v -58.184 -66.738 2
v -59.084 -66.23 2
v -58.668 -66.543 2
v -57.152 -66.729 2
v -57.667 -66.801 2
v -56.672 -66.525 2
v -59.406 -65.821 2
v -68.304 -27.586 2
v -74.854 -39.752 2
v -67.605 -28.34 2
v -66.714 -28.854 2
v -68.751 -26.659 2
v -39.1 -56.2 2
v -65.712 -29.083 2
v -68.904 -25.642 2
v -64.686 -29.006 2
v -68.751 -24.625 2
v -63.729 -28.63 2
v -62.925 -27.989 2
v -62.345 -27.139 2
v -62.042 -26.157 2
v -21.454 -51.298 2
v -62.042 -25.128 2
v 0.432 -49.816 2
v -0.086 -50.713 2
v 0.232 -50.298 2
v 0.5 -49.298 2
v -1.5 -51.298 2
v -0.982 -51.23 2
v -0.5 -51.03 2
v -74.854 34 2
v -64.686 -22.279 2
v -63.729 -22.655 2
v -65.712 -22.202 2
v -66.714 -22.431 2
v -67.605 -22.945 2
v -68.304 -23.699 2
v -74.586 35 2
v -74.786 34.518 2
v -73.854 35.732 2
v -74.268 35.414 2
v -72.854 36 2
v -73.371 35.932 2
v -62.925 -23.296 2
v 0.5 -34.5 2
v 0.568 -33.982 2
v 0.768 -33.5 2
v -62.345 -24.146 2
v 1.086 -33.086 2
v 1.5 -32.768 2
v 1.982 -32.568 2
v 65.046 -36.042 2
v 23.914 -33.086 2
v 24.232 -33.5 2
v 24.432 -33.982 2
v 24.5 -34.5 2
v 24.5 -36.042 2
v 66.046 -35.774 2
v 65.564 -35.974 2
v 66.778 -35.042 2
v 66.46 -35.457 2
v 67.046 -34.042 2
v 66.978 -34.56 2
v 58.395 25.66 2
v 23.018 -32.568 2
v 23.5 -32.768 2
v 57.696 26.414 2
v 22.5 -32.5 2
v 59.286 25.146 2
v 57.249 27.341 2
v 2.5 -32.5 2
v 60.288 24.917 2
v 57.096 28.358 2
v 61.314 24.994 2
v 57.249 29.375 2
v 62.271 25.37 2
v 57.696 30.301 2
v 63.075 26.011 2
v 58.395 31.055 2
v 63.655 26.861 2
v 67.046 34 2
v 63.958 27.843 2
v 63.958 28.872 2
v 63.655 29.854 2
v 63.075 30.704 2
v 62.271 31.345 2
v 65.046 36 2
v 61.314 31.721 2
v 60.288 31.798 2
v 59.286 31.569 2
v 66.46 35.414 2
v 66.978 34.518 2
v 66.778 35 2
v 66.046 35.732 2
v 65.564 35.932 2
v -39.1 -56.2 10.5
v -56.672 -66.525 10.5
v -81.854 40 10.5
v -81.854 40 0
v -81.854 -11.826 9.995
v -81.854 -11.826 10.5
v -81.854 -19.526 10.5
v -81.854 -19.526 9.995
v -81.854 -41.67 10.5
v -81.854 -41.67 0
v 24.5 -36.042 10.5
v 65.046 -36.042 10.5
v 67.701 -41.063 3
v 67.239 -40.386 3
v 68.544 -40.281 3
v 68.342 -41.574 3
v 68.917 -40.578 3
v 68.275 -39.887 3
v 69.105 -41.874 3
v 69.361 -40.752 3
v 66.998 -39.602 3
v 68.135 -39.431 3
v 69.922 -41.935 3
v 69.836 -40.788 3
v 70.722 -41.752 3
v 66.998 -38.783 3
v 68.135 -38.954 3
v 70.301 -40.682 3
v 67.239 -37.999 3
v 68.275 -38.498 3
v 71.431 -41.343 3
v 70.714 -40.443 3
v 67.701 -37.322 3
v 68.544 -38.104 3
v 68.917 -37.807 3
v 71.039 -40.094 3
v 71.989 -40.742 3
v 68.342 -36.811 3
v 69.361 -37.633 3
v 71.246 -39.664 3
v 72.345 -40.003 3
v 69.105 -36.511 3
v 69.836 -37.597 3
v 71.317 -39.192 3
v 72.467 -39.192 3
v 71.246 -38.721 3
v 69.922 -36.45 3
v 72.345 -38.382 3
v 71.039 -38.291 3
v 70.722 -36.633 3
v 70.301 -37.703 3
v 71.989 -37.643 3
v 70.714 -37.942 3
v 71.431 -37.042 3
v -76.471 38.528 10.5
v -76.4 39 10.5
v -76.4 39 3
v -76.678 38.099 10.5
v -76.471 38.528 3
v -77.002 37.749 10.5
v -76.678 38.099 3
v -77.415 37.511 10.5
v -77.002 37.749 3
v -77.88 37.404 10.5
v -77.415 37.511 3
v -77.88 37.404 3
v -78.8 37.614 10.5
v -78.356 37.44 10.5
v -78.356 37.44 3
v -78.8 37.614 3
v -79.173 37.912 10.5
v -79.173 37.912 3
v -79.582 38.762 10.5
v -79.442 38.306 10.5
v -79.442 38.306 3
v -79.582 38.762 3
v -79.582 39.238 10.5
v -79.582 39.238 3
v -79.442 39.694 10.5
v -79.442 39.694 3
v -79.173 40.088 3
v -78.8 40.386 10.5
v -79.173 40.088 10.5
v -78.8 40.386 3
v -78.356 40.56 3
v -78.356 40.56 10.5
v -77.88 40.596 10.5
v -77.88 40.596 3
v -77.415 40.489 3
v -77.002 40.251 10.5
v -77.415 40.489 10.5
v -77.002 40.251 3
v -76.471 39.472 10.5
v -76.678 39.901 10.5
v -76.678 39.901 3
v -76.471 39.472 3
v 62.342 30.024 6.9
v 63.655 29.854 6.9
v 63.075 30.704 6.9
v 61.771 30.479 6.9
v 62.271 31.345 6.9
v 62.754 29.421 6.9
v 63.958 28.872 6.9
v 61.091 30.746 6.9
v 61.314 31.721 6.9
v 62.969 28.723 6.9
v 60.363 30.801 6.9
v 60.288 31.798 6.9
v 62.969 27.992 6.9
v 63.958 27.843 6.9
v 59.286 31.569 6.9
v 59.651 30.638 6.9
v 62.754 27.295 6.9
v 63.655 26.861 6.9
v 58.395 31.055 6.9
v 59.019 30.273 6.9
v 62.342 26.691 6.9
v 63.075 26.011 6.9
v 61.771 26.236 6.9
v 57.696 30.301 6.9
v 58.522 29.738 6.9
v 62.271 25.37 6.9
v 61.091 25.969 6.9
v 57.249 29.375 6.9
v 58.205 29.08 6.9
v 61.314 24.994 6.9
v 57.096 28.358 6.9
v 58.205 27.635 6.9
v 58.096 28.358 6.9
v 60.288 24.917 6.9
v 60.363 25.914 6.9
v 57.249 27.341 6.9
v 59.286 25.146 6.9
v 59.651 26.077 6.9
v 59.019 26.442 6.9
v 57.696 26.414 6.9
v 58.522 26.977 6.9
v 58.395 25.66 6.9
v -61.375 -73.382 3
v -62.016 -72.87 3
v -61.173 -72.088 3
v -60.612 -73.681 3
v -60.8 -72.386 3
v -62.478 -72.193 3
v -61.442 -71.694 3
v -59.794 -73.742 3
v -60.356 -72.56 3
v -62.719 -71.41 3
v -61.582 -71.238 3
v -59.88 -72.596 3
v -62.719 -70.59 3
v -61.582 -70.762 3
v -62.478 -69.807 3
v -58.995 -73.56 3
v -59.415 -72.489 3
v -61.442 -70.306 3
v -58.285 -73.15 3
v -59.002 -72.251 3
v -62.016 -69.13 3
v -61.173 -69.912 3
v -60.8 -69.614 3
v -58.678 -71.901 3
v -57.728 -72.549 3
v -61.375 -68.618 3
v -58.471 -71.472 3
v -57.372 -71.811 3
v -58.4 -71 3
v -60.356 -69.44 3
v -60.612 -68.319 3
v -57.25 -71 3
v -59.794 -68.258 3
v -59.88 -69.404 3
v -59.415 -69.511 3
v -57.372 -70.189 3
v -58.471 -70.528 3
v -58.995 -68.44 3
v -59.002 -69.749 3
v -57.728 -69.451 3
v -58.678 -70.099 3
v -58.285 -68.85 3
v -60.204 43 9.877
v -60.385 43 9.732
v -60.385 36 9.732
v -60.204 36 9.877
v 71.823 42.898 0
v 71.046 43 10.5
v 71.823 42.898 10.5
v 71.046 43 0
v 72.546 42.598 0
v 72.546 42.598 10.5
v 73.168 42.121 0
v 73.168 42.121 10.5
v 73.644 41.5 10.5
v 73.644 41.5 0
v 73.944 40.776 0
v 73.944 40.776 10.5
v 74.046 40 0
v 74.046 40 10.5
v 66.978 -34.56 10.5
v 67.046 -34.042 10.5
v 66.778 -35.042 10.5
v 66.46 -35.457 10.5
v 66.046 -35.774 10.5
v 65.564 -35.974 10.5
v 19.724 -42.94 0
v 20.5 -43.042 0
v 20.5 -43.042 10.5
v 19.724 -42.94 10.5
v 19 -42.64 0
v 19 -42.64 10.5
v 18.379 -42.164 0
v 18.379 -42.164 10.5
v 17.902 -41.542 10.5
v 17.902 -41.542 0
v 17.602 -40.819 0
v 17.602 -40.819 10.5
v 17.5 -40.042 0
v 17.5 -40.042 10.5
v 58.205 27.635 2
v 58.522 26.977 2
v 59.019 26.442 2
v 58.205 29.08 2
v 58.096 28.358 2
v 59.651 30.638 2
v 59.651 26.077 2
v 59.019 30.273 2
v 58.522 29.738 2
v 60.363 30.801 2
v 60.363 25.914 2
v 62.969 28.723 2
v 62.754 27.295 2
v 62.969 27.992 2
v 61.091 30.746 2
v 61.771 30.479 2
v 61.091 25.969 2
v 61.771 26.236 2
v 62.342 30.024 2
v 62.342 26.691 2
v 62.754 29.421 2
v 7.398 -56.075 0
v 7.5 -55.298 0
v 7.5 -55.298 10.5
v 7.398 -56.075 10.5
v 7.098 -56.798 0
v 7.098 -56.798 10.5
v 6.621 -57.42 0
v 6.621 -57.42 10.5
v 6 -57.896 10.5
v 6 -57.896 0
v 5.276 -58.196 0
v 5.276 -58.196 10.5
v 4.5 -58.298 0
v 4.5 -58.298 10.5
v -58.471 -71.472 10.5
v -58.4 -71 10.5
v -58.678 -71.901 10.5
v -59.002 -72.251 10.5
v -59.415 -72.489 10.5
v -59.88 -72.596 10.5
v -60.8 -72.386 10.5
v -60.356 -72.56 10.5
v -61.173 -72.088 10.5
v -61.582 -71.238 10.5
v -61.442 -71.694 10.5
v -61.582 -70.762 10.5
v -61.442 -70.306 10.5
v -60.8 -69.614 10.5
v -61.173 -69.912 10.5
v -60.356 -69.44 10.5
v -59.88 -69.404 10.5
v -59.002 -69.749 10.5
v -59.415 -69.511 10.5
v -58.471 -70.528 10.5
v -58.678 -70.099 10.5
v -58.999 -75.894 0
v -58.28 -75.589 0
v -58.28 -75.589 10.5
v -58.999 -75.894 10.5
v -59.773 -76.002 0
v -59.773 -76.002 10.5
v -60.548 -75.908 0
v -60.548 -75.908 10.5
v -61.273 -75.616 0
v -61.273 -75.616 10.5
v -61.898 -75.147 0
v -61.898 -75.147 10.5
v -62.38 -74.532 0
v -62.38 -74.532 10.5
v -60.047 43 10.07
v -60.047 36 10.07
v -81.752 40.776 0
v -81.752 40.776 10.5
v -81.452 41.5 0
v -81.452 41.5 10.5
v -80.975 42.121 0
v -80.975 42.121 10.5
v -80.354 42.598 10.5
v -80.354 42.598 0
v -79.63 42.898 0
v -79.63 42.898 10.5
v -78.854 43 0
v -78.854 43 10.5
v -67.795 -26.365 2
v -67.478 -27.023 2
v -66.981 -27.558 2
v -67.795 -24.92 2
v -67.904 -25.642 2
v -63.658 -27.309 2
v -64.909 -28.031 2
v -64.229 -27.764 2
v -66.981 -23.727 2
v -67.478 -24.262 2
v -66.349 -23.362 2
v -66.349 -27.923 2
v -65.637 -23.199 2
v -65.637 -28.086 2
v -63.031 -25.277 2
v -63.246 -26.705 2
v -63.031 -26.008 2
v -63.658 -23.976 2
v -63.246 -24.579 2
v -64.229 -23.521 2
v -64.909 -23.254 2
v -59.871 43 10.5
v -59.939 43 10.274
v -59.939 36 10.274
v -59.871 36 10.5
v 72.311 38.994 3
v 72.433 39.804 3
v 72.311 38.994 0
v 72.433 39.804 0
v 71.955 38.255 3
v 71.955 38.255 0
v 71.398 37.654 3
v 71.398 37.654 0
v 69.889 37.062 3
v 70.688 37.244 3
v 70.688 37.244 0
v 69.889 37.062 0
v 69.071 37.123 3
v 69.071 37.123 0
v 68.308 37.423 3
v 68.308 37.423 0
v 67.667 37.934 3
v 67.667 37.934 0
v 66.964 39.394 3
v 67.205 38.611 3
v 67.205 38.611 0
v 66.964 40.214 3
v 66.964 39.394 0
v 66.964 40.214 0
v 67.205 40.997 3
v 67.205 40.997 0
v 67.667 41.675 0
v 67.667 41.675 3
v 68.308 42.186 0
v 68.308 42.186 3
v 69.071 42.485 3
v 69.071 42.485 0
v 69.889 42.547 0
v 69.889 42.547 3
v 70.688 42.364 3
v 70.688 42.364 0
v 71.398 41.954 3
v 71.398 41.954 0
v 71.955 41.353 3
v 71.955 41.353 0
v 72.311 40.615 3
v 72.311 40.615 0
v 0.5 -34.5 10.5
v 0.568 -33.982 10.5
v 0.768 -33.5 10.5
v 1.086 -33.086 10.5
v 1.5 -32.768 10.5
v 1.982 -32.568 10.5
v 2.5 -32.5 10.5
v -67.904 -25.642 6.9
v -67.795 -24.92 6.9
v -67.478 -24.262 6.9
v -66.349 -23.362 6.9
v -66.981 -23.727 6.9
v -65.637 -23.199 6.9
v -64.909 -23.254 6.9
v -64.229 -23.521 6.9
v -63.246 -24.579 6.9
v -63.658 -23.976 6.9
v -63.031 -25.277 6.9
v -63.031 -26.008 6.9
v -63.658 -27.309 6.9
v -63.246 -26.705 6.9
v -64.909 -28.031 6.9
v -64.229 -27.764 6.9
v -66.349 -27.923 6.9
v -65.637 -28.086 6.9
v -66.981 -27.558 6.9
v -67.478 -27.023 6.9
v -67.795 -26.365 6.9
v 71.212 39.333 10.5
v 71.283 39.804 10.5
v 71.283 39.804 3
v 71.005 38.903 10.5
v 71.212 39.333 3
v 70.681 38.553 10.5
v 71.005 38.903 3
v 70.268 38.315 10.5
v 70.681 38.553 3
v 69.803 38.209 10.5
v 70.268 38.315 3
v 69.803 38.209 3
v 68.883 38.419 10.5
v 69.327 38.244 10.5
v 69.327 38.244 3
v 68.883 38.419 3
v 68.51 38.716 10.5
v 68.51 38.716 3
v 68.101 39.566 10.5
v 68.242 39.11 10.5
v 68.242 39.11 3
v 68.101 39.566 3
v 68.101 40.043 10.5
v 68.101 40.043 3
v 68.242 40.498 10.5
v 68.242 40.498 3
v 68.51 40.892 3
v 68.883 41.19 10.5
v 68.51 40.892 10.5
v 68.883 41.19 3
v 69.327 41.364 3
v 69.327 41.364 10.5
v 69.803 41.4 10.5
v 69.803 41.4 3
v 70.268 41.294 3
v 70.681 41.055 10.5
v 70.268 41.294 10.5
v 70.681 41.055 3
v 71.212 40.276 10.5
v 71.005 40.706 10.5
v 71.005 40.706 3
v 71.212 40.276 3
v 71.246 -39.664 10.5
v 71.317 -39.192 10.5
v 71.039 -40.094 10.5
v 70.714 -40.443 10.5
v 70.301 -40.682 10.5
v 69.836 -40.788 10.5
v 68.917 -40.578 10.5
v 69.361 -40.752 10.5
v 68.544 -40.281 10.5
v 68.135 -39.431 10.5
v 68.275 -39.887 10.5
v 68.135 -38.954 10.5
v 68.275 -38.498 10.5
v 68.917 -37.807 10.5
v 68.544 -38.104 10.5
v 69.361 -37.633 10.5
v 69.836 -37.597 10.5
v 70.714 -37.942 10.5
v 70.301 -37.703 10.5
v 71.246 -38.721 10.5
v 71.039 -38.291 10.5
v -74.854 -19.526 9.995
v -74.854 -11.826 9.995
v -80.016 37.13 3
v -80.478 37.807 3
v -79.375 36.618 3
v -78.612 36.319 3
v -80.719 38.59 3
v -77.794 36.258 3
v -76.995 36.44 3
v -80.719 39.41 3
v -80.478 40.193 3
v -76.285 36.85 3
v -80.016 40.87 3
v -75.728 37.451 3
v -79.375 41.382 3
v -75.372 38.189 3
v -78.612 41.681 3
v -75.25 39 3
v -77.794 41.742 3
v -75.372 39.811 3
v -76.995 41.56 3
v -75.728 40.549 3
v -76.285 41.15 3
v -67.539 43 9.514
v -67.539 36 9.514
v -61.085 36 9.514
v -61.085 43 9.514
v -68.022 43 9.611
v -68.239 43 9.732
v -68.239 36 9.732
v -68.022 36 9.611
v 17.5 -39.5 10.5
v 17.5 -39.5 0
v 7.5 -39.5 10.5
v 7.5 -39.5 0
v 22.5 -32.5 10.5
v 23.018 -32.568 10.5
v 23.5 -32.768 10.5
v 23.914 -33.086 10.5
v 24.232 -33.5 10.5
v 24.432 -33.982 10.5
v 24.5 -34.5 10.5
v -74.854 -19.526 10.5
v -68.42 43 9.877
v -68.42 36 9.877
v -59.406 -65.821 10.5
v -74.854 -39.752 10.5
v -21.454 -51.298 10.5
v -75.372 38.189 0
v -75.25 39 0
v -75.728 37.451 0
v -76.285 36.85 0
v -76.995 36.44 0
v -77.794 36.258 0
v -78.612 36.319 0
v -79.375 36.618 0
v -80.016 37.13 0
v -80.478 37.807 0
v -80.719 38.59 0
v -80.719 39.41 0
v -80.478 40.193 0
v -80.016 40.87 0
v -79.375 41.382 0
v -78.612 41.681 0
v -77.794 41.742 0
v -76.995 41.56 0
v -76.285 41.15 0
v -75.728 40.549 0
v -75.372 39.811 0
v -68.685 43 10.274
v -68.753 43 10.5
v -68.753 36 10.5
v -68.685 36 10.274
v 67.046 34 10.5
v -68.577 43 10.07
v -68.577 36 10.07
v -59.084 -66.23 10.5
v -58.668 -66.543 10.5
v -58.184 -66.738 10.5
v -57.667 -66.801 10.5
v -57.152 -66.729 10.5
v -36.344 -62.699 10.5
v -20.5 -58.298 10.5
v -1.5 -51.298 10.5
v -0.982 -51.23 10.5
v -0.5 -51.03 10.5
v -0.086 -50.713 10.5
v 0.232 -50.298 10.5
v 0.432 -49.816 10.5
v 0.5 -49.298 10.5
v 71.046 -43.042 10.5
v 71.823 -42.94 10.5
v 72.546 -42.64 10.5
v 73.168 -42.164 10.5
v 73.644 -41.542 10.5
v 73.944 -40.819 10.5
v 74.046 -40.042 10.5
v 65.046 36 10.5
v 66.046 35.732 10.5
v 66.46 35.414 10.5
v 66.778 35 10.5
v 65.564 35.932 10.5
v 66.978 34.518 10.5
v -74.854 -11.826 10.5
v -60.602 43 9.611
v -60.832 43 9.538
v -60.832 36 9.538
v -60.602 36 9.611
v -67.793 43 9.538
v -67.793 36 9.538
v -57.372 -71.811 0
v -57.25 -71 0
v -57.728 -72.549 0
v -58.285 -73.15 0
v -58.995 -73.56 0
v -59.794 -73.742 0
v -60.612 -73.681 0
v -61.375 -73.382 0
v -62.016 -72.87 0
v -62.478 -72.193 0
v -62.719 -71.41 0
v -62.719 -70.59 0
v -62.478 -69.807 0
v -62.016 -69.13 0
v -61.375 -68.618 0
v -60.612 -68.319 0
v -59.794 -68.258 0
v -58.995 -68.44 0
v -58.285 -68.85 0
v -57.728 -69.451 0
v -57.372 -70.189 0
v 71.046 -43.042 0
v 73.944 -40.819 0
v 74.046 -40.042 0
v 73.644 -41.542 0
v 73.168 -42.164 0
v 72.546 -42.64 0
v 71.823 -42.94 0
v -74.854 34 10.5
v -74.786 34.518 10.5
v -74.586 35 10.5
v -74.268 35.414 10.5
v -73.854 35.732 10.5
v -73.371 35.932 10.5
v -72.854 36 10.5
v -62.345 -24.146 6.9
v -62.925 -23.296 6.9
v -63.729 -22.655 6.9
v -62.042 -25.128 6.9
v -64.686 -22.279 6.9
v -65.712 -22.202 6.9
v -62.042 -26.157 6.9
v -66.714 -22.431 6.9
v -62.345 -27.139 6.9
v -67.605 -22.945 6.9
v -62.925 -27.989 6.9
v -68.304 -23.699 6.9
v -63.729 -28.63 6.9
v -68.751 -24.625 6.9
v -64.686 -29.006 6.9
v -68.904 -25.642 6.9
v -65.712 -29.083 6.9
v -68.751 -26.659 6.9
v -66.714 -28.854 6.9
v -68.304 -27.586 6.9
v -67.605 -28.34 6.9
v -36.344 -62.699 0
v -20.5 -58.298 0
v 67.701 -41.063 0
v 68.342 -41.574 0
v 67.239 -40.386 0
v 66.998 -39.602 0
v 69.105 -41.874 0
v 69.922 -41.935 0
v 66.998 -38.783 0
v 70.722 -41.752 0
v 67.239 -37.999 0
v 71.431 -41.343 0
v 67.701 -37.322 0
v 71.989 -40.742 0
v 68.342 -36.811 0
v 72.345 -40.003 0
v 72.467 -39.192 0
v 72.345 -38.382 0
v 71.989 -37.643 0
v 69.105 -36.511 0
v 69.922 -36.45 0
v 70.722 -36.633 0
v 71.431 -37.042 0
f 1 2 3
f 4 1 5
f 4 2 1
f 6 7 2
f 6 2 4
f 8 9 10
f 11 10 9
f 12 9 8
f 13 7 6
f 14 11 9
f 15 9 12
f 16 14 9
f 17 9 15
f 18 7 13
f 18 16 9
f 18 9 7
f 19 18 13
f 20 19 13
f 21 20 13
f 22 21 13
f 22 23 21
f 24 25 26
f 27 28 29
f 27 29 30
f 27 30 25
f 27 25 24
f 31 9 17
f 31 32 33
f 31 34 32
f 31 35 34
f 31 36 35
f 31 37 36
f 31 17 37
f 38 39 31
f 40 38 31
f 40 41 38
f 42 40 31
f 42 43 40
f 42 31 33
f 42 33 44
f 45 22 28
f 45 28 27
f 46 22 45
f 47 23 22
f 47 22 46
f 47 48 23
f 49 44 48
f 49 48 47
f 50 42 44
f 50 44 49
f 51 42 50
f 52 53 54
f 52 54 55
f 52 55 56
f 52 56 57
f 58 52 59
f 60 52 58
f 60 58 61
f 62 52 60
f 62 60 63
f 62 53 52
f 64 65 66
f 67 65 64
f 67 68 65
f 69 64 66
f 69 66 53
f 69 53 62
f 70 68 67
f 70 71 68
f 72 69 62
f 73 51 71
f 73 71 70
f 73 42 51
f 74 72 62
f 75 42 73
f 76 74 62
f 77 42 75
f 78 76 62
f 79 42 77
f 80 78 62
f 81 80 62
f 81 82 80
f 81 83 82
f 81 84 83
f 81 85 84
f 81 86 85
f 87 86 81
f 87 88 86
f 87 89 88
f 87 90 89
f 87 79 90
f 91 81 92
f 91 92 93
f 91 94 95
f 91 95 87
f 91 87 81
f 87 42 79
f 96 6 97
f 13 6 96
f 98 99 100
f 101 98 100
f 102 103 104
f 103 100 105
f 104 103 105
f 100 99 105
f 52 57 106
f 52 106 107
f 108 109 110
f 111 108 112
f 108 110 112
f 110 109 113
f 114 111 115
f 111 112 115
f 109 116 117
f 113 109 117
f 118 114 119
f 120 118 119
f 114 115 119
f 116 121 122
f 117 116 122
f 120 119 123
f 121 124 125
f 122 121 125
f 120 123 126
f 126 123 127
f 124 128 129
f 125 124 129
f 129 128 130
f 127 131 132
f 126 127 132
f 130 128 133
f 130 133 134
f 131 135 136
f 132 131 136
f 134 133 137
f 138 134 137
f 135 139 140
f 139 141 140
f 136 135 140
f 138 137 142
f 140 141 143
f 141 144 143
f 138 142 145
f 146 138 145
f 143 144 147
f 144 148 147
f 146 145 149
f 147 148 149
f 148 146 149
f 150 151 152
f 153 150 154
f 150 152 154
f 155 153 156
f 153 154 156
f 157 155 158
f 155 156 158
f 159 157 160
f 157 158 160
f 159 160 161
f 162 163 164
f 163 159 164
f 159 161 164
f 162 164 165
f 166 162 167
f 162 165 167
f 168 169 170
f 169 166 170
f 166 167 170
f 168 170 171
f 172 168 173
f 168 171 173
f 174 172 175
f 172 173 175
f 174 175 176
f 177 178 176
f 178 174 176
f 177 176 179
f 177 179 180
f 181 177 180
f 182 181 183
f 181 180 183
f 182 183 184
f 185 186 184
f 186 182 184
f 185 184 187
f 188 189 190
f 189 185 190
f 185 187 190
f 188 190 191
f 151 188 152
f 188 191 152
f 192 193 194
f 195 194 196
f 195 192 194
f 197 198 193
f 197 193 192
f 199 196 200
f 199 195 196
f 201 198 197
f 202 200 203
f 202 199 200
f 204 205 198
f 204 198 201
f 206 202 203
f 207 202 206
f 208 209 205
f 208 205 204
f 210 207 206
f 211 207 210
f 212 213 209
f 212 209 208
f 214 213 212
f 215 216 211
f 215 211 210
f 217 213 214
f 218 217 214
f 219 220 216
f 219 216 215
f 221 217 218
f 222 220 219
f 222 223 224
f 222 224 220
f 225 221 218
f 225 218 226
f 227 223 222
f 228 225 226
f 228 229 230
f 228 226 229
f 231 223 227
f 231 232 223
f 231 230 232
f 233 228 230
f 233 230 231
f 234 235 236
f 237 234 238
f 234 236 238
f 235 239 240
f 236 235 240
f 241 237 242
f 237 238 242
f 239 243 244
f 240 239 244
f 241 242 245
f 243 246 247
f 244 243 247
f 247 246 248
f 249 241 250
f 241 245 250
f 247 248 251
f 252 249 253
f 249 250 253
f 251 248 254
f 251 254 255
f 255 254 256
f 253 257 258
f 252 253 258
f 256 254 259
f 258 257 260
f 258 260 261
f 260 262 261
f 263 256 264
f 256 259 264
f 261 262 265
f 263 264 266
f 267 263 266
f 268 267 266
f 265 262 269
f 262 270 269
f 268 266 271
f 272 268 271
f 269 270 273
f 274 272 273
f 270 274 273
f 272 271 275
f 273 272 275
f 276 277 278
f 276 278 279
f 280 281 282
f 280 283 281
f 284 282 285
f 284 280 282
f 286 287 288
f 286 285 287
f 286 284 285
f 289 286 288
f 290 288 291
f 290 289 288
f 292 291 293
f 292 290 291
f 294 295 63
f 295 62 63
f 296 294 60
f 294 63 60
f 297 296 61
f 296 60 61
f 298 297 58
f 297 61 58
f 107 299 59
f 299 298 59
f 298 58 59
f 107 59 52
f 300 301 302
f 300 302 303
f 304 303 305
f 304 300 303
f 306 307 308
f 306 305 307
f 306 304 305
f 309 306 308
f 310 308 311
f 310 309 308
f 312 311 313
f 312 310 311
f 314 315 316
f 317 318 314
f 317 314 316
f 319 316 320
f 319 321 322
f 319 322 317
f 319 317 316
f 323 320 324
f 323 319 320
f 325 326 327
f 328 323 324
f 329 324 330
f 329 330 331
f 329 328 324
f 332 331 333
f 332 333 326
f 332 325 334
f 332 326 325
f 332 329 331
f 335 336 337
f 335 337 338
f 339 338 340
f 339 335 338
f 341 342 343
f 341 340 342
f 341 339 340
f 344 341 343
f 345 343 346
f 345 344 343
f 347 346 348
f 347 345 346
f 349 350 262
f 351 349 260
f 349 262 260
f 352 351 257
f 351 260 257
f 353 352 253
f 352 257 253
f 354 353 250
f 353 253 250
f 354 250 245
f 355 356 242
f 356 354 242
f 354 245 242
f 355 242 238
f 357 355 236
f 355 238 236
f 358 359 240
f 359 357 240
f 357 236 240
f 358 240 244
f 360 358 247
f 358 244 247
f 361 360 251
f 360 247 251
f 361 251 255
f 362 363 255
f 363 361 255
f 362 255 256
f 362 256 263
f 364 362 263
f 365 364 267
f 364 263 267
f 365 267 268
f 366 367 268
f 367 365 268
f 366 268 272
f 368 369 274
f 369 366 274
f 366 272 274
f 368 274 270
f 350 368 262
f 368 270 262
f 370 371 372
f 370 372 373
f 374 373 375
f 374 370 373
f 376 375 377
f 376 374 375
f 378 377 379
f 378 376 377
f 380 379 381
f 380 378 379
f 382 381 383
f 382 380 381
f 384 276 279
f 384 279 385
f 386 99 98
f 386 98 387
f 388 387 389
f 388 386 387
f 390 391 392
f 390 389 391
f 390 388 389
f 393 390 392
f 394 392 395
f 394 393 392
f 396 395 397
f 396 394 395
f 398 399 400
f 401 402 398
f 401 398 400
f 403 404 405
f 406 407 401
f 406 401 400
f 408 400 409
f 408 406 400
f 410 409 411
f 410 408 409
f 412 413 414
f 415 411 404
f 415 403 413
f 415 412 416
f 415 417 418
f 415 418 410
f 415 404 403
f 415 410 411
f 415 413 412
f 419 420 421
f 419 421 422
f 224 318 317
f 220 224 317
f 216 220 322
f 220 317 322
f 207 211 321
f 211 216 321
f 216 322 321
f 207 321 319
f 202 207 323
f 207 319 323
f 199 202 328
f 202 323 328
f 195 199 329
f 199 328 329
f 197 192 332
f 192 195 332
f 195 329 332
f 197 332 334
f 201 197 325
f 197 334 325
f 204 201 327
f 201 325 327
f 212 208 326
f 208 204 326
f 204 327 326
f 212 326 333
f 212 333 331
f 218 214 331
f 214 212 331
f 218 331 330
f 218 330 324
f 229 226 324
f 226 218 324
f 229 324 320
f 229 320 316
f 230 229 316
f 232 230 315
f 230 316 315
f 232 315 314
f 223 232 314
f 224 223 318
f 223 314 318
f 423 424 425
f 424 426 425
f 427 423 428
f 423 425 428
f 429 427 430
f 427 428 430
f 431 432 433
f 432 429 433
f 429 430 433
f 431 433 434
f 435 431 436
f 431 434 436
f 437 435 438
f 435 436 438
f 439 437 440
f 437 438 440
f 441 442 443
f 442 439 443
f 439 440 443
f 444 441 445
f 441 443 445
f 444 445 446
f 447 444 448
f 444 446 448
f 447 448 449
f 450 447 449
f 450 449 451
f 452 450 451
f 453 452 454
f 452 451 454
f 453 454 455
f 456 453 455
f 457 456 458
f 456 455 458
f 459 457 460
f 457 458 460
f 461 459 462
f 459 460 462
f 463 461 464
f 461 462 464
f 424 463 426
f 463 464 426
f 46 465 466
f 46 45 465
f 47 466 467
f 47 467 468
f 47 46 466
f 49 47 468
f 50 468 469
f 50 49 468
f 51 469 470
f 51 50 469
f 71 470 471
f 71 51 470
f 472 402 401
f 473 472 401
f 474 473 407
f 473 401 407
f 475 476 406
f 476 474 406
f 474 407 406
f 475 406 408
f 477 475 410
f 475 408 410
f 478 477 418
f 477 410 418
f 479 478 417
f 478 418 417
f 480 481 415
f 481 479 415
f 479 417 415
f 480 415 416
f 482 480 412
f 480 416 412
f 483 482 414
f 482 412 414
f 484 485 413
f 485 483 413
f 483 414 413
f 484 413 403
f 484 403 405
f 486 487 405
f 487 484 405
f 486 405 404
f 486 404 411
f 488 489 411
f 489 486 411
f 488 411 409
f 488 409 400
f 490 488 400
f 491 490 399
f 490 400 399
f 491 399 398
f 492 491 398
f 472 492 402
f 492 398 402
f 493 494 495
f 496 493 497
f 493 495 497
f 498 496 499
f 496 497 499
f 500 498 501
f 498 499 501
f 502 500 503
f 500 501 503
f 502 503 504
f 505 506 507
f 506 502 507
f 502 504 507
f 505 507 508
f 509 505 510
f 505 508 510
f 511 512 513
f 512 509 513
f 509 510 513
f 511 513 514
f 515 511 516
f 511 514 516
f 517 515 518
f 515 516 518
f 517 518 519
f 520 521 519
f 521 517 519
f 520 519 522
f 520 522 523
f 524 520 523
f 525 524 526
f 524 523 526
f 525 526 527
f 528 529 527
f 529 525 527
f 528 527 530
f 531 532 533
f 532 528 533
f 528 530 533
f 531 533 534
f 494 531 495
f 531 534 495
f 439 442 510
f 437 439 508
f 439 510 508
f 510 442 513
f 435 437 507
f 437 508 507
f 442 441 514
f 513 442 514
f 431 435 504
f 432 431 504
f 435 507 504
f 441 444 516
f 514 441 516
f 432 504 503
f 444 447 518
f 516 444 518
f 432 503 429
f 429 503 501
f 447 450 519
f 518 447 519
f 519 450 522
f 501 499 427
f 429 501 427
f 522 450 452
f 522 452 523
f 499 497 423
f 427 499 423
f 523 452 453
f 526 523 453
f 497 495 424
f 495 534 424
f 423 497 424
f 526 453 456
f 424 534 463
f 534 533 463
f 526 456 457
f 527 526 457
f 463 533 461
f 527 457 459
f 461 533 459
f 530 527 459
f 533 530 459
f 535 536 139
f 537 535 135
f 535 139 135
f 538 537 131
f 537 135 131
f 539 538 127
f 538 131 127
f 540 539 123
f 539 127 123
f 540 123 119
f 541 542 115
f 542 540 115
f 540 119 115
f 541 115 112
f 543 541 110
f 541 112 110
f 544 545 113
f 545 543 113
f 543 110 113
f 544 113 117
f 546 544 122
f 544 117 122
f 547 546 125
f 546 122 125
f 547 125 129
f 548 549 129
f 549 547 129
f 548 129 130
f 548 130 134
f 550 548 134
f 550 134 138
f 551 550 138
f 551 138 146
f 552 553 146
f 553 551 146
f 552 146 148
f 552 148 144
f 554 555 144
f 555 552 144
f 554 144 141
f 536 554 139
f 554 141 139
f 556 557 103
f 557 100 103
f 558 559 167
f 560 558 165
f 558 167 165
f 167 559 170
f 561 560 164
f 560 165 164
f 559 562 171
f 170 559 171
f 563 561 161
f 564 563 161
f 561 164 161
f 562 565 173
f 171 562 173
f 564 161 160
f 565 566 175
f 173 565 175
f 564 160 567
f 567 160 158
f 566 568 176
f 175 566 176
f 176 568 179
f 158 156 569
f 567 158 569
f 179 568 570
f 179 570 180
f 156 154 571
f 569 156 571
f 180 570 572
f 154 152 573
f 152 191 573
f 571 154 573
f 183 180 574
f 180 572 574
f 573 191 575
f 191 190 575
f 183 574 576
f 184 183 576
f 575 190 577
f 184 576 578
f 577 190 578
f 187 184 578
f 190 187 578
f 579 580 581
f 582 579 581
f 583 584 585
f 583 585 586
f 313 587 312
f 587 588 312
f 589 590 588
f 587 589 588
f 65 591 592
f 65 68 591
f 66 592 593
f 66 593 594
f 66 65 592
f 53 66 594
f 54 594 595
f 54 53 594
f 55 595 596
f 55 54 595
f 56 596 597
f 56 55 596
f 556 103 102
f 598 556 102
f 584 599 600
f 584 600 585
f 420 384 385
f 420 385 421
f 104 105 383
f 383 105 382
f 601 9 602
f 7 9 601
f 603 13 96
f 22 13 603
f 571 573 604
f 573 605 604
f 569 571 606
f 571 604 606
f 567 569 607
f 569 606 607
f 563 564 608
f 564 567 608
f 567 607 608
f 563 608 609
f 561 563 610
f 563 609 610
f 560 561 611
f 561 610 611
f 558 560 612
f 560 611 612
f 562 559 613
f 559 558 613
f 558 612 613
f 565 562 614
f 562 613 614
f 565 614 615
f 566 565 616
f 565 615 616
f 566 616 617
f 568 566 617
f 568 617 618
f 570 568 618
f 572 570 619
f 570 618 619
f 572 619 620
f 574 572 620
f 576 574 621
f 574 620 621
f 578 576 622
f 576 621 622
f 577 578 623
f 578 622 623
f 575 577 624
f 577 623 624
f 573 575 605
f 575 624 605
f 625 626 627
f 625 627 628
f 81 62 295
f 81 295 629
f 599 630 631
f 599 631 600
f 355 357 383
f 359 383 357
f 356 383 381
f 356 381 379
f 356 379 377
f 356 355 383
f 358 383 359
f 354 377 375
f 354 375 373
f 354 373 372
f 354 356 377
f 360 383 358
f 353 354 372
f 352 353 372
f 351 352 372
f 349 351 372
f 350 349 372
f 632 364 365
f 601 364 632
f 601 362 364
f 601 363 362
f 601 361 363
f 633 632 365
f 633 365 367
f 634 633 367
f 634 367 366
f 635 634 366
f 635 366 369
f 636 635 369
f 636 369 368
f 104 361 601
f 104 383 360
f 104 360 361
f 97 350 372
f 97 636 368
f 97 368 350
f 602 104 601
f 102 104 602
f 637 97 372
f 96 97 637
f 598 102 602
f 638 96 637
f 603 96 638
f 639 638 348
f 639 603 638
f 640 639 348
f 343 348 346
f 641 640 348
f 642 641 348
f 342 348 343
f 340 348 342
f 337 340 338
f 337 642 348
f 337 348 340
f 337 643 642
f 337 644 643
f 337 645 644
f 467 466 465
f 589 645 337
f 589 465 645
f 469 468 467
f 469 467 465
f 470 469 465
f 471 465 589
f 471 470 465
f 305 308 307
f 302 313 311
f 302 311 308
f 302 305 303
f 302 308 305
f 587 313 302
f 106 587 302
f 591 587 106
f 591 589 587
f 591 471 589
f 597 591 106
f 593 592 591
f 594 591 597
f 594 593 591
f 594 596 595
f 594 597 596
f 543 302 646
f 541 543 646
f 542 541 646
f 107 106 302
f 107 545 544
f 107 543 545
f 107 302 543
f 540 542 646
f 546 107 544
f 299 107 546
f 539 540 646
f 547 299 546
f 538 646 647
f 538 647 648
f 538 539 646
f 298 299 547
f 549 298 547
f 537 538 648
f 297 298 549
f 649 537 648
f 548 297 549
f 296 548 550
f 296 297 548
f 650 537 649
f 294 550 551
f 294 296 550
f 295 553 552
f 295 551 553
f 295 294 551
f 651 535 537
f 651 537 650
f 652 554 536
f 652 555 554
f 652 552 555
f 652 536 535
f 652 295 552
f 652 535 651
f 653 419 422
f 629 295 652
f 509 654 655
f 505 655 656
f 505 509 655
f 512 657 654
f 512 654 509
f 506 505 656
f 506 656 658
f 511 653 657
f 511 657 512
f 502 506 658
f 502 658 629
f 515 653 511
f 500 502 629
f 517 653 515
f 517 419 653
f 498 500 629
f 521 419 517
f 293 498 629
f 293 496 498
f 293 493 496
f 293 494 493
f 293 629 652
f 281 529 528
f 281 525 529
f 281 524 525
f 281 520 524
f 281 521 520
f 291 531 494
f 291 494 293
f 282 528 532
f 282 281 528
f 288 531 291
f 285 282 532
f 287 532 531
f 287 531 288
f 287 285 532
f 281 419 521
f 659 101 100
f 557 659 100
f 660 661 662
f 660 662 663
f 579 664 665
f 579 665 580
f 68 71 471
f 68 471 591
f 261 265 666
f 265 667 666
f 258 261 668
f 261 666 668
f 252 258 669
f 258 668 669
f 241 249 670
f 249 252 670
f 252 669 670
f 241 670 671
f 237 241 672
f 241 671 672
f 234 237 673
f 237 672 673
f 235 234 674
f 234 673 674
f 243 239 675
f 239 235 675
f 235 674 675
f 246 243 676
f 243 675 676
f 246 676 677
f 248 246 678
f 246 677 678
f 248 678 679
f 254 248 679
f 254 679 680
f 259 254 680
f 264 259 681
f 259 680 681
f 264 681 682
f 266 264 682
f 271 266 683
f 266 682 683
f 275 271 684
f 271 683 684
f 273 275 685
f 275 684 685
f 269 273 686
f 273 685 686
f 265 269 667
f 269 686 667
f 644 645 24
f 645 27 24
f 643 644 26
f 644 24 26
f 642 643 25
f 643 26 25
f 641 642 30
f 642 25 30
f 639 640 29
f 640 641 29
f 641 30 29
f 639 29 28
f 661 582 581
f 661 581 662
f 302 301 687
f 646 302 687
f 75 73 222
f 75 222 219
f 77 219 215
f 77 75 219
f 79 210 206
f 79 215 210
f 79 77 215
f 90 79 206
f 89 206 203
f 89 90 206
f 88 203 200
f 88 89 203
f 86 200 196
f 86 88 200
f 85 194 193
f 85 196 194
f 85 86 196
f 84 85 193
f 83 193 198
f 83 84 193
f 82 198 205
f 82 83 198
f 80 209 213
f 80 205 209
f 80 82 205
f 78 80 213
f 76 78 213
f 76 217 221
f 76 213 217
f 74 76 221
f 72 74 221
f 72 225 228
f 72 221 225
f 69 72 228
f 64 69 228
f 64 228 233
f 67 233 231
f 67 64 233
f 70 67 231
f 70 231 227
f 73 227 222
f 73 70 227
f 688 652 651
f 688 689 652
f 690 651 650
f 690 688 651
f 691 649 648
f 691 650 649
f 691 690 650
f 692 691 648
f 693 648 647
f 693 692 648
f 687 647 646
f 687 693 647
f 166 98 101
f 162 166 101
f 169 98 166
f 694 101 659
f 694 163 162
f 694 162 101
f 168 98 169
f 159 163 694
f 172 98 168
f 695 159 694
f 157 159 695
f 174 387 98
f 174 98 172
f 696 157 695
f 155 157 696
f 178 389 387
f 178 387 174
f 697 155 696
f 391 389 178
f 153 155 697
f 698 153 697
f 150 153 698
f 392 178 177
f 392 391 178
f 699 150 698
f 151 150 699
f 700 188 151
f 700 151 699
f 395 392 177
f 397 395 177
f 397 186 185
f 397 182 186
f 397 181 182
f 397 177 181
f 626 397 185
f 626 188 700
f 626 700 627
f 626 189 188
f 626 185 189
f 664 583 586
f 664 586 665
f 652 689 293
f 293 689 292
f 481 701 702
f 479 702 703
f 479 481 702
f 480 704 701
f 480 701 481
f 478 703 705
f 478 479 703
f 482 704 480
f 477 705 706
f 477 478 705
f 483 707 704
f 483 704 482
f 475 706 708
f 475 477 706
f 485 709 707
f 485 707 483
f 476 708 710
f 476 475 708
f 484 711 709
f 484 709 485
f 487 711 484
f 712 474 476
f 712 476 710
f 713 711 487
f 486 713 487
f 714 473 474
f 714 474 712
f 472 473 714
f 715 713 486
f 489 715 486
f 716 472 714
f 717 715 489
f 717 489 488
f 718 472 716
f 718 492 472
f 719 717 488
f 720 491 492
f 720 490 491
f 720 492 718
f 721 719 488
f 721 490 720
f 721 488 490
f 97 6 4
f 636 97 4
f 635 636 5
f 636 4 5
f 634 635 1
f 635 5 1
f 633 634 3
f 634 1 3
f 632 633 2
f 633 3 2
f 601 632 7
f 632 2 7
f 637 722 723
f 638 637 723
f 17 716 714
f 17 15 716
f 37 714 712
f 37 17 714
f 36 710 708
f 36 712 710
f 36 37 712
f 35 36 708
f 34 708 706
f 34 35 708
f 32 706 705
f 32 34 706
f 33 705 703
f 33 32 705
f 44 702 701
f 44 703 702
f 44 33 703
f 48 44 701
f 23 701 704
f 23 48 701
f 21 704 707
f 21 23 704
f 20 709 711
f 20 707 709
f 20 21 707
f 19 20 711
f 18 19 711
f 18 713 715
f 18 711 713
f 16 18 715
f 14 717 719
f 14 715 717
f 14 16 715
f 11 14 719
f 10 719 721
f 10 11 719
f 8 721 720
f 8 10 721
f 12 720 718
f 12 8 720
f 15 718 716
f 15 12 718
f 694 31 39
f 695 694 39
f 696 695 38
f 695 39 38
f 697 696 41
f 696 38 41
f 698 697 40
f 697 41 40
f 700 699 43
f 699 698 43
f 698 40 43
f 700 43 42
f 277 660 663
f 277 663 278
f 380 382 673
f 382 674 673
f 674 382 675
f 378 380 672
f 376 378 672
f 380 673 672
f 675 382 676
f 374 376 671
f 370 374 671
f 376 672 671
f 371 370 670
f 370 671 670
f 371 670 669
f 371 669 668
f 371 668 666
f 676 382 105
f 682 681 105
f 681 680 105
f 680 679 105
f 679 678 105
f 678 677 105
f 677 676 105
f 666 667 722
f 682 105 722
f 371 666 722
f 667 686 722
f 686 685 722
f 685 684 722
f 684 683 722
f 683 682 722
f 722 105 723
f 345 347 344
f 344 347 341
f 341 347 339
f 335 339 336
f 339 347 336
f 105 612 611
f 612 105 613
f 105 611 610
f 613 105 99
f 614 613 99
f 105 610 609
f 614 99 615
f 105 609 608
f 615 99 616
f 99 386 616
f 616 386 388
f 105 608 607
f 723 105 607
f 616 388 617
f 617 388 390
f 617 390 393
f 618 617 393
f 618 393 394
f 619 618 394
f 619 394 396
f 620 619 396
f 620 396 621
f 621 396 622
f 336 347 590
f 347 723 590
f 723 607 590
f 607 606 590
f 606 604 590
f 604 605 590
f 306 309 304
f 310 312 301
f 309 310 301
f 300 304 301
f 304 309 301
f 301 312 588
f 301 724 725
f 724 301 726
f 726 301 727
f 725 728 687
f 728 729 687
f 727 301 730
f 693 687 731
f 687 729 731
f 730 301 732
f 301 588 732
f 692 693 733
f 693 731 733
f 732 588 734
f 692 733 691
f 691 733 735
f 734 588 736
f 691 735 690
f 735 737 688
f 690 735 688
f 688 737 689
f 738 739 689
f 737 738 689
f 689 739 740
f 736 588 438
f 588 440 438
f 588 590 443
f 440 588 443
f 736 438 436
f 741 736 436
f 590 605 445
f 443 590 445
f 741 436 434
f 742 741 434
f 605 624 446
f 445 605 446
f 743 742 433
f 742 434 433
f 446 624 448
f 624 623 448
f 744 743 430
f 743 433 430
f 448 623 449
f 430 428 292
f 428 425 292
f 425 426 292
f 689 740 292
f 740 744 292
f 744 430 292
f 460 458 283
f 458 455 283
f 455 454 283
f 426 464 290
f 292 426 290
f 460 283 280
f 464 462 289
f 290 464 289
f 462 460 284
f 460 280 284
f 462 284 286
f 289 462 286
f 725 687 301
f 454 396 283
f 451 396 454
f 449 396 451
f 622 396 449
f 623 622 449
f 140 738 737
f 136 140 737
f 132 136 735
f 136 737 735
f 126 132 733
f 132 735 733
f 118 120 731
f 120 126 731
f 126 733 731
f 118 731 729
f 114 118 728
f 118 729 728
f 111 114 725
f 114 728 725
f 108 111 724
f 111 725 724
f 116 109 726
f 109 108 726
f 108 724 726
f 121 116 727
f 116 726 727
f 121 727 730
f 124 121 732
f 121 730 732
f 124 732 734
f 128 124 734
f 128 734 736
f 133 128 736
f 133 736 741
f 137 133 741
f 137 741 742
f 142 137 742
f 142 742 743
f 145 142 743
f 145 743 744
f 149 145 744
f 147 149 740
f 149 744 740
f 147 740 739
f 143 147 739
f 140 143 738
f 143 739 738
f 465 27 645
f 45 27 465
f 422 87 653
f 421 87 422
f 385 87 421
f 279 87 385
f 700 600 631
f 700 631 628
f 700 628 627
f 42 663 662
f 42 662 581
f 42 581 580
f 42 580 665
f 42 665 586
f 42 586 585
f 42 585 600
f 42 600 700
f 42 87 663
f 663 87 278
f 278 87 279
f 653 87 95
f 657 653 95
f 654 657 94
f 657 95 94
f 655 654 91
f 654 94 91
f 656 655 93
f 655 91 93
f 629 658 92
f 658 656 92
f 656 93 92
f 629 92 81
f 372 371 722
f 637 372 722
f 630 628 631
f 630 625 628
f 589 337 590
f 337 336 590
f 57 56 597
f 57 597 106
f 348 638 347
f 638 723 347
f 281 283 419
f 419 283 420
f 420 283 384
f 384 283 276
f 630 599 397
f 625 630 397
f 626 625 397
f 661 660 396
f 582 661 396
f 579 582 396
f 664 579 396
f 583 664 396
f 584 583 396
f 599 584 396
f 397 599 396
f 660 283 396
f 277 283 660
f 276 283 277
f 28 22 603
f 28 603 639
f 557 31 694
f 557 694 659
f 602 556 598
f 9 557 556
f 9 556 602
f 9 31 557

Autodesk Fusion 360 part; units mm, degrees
sketch "Right_enclosure_outline" plane through (0, 0, 0) normal (0, 0, 1) x (1, 0, 0)
  line L0 (-73.4538, 34.3576) -> (65.5462, 34.3576)
  arc A0 (-73.5521, 34.3552) -> (-74.4514, 33.4559) centre (-73.4538, 33.3576) ccw
  line L1 (-74.4538, -39.6424) -> (-74.4538, 33.3576)
  line L2 (-58.9585, -65.7908) -> (-74.4538, -39.6424)
  line L3 (-39.4538, -55.6424) -> (-57.5971, -66.1464)
  line L4 (-21.4538, -50.6424) -> (-39.4538, -55.6424)
  arc A1 (-58.9067, -65.8736) -> (-57.6828, -66.1933) centre (-58.0982, -65.2811) ccw
  line L5 (-0.9538, -50.6424) -> (-21.4538, -50.6424)
  arc A2 (-0.8556, -50.64) -> (0.0438, -49.7406) centre (-0.9538, -49.6424) ccw
  line L6 (0.0462, -32.6424) -> (0.0462, -49.6424)
  line L7 (24.5462, -31.6424) -> (1.0462, -31.6424)
  line L8 (25.5462, -34.6424) -> (25.5462, -32.6424)
  line L9 (64.5462, -35.6424) -> (26.5462, -35.6424)
  line L10 (66.5462, 33.3576) -> (66.5462, -33.6424)
  line L11 (2.5, -32.5) -> (22.5, -32.5)
  line L12 (-56.6719, -66.5254) -> (-39.1, -56.2)
  line L13 (-39.1, -56.2) -> (-21.4538, -51.2983)
  line L14 (-21.4538, -51.2983) -> (-1.5, -51.2983)
  arc A3 (22.5, -32.5) -> (24.5, -34.5) centre (22.5, -34.5) cw
  line L15 (24.5, -34.5) -> (24.5, -36.0424)
  line L16 (-74.8538, 31.6376) -> (-74.8538, 0.3904)
  line L17 (-74.8538, 0.3904) -> (-74.8538, -39.752)
  line L18 (-74.8538, 34) -> (-74.8538, 31.6376)
  line L19 (-74.8538, -39.752) -> (-59.4057, -65.8207)
  line L20 (0.5, -49.2983) -> (0.5, -34.5)
  arc A4 (0.5, -34.5) -> (2.5, -32.5) centre (2.5, -34.5) cw
  line L21 (65.0462, 36) -> (-72.8538, 36)
  line L22 (67.0462, -34.0424) -> (67.0462, 34)
  line L23 (44.5449, -36.0424) -> (65.0462, -36.0424)
  line L24 (24.5, -36.0424) -> (44.5449, -36.0424)
  line L25 (-21.4538, -51.2983) -> (-1.5, -51.2983)
  line L26 (2.5, -32.5) -> (22.5, -32.5)
  line L27 (-74.8538, 34) -> (-74.8538, 31.6376)
  arc A5 (67.0462, 34) -> (65.0462, 36) centre (65.0462, 34) ccw
  line L28 (-39.1, -56.2) -> (-21.4538, -51.2983)
  line L29 (0.5, -49.2983) -> (0.5, -34.5)
  line L30 (65.0462, 36) -> (-72.8538, 36)
  line L31 (67.0462, -34.0424) -> (67.0462, 34)
  arc A6 (-72.8538, 36) -> (-74.8538, 34) centre (-72.8538, 34) ccw
  line L32 (-74.8538, 0.3904) -> (-74.8538, -39.752)
  arc A7 (65.0462, -36.0424) -> (67.0462, -34.0424) centre (65.0462, -34.0424) ccw
  line L33 (-56.6719, -66.5254) -> (-39.1, -56.2)
  line L34 (-74.8538, -39.752) -> (-59.4057, -65.8207)
  line L35 (24.5, -34.5) -> (24.5, -36.0424)
  arc A8 (-59.4057, -65.8207) -> (-56.6719, -66.5254) centre (-57.6851, -64.8011) ccw
  arc A9 (-1.5, -51.2983) -> (0.5, -49.2983) centre (-1.5, -49.2983) ccw
  line L36 (44.5449, -36.0424) -> (65.0462, -36.0424)
  line L37 (-74.8538, 31.6376) -> (-74.8538, 0.3904)
  line L38 (24.5, -36.0424) -> (44.5449, -36.0424)
  line L39 (-20.4997, -58.2983) -> (4.5, -58.2983)
  line L40 (-81.8538, -41.6703) -> (-62.3802, -74.532)
  line L41 (7.5, -55.2983) -> (7.5, -39.5)
  arc A10 (-62.3802, -74.532) -> (-58.2795, -75.5891) centre (-59.7994, -73.0026) ccw
  arc A11 (17.5, -40.0424) -> (20.5, -43.0424) centre (20.5, -40.0424) ccw
  line L42 (7.5, -39.5) -> (17.5, -39.5)
  line L43 (-58.2795, -75.5891) -> (-36.3436, -62.6994)
  line L44 (-81.8538, 31.6376) -> (-81.8538, 0.3904)
  line L45 (-81.8538, 0.3904) -> (-81.8538, -41.6703)
  line L46 (74.0462, -40.0424) -> (74.0462, 40)
  arc A12 (74.0462, 40) -> (71.0462, 43) centre (71.0462, 40) ccw
  line L47 (-36.3436, -62.6994) -> (-20.4997, -58.2983)
  line L48 (44.5449, -43.0424) -> (71.0462, -43.0424)
  arc A13 (-78.8538, 43) -> (-81.8538, 40) centre (-78.8538, 40) ccw
  arc A14 (4.5, -58.2983) -> (7.5, -55.2983) centre (4.5, -55.2983) ccw
  arc A15 (71.0462, -43.0424) -> (74.0462, -40.0424) centre (71.0462, -40.0424) ccw
  line L49 (17.5, -39.5) -> (17.5, -40.0424)
  line L50 (-81.8538, 40) -> (-81.8538, 31.6376)
  line L51 (20.5, -43.0424) -> (44.5449, -43.0424)
  line L52 (71.0462, 43) -> (-78.8538, 43)
  circle A16 centre (-78, 39) radius 1.6
  circle A17 centre (-60, -71) radius 1.6
  circle A18 centre (69.7169, -39.1925) radius 1.6
  circle A19 centre (69.6831, 39.8042) radius 1.6
  circle A20 centre (-65.4538, -25.6424) radius 1.5875
  line L53 (-59.5038, -16.8424) -> (-59.5038, -10.8424)
  line L54 (-65.4038, -16.8424) -> (-65.4038, -10.8424)
  circle A21 centre (60.5462, 28.3576) radius 1.5875
  arc A22 (25.5486, -34.7406) -> (26.4479, -35.64) centre (26.5462, -34.6424) ccw
  arc A23 (25.5438, -32.5441) -> (24.6444, -31.6448) centre (24.5462, -32.6424) ccw
  arc A24 (64.6891, -35.6398) -> (66.5436, -33.7853) centre (64.5462, -33.6424) ccw
  arc A25 (66.5438, 33.4559) -> (65.6444, 34.3552) centre (65.5462, 33.3576) ccw
  arc A26 (-72.8538, 36) -> (-74.8538, 34) centre (-72.8538, 34) ccw
  arc A27 (-59.4057, -65.8207) -> (-56.6719, -66.5254) centre (-57.6851, -64.8011) ccw
  arc A28 (-1.5, -51.2983) -> (0.5, -49.2983) centre (-1.5, -49.2983) ccw
  arc A29 (2.5, -32.5) -> (0.5, -34.5) centre (2.5, -34.5) ccw
  arc A30 (24.5, -34.5) -> (22.5, -32.5) centre (22.5, -34.5) ccw
  arc A31 (65.0462, -36.0424) -> (67.0462, -34.0424) centre (65.0462, -34.0424) ccw
  arc A32 (67.0462, 34) -> (65.0462, 36) centre (65.0462, 34) ccw
  dimension "d1" = 2
extrude "Extrude1" add sketch "Right_enclosure_outline" along normal blind 10.5 contours L39 L40 L41 A10 A11 L42 L43 L44 L45 L46 A12 L47 L48 A13 A14 A15 L49 L50 L51 L52
extrude "Extrude2" add sketch "Right_enclosure_outline" along normal blind 2 contours L11 L12 L13 L14 A3 L15 L16 L17 L18 L19 L20 A4 L21 L22 L23 L24 L25 L26 L27 A5 L28 L29 L30 L31 A6 L32 A7 L33 L34 L35 A8 A9 L36 L37 L38 A26 A27 A28 A29 A30 A31 A32 | A20 | A21
sketch "Sketch2" plane through (0, 0, 0) normal (0, 0, 1) x (1, 0, 0)
  circle A0 centre (69.6831, 39.8042) radius 2.75
  circle A1 centre (69.7169, -39.1925) radius 2.75
  circle A2 centre (-60, -71) radius 2.75
  circle A3 centre (-78, 39) radius 2.75
  point P0 (69.6831, 39.8042)
  point P1 (69.7169, -39.1925)
  point P2 (-60, -71)
  point P3 (-78, 39)
  dimension "d6" = 5.5
  dimension "d9" = 5.5
  dimension "d10" = 5.5
  dimension "d11" = 5.5
extrude "Extrude3" cut sketch "Sketch2" along normal blind 3 contours A0
extrude "Extrude4" cut sketch "Sketch2" along normal blind 3 contours A1 | A2 | A3
sketch "Sketch3" plane through (0, 0, 2) normal (0, 0, 1) x (-1, 0, 0)
  line L0 (-24.5, 34.5) -> (-24.5, 36.0424)
  line L1 (-24.5, 36.0424) -> (-65.0462, 36.0424)
  arc A0 (-65.0462, 36.0424) -> (-67.0462, 34.0424) centre (-65.0462, 34.0424) ccw
  line L2 (-67.0462, 34.0424) -> (-67.0462, -34)
  arc A1 (-67.0462, -34) -> (-65.0462, -36) centre (-65.0462, -34) ccw
  line L3 (-65.0462, -36) -> (72.8538, -36)
  arc A2 (72.8538, -36) -> (74.8538, -34) centre (72.8538, -34) ccw
  line L4 (74.8538, -34) -> (74.8538, 39.752)
  line L5 (74.8538, 39.752) -> (59.4057, 65.8207)
  arc A3 (59.4057, 65.8207) -> (56.6719, 66.5254) centre (57.6851, 64.8011) ccw
  line L6 (56.6719, 66.5254) -> (39.1, 56.2)
  line L7 (39.1, 56.2) -> (21.4538, 51.2983)
  line L8 (21.4538, 51.2983) -> (1.5, 51.2983)
  arc A4 (1.5, 51.2983) -> (-0.5, 49.2983) centre (1.5, 49.2983) ccw
  line L9 (-0.5, 49.2983) -> (-0.5, 34.5)
  arc A5 (-2.5, 32.5) -> (-0.5, 34.5) centre (-2.5, 34.5) ccw
  line L10 (-2.5, 32.5) -> (-22.5, 32.5)
  arc A6 (-24.5, 34.5) -> (-22.5, 32.5) centre (-22.5, 34.5) ccw
  circle A7 centre (65.4538, 25.6424) radius 1.5875
  circle A8 centre (-60.5462, -28.3576) radius 1.5875
  circle A9 centre (65.4538, 25.6424) radius 2.45
  circle A10 centre (65.4538, 25.6424) radius 3.45
  circle A11 centre (-60.5462, -28.3576) radius 2.45
  circle A12 centre (-60.5462, -28.3576) radius 3.45
  point P0 (-60.5462, -28.3576)
  dimension "d14" = 4.9
  dimension "d15" = 1
  dimension "d16" = 4.9
  dimension "d17" = 1
extrude "Extrude5" add sketch "Sketch3" along normal blind 4.9 contours A10 | A12
sketch "swopeniing" plane through (-81.8538, 0, 0) normal (-1, 0, 0) x (0, -1, 0)
  line L0 (-40, 0) -> (41.6703, 0)
  line L1 (41.6703, 10.5) -> (-40, 10.5)
  line L2 (-40, 10.5) -> (-40, 0)
  line L3 (41.6703, 0) -> (41.6703, 10.5)
  line L4 (18.0355, 9.995) -> (18.1755, 9.995)
  arc A0 (13.3155, 9.995) -> (13.6755, 10.355) centre (13.3155, 10.355) ccw
  line L5 (11.8255, 9.995) -> (13.1755, 9.995)
  line L6 (17.6755, 12.195) -> (17.6755, 10.355)
  line L7 (18.1755, 9.995) -> (19.5255, 9.995)
  line L8 (13.6755, 10.355) -> (13.6755, 12.195)
  line L9 (19.5255, 12.895) -> (11.8255, 12.895)
  line L10 (13.6755, 12.195) -> (17.6755, 12.195)
  arc A1 (17.6755, 10.355) -> (18.0355, 9.995) centre (18.0355, 10.355) ccw
  line L11 (11.8255, 12.895) -> (11.8255, 9.995)
  line L12 (19.5255, 9.995) -> (19.5255, 12.895)
  line L13 (13.1755, 9.995) -> (13.3155, 9.995)
  line L14 (18.1255, 9.995) -> (13.2255, 9.995)
extrude "Extrude6" cut sketch "swopeniing" against normal blind 20 contours L1 A0 L5 L8 L11 L13 L14 | L1 L4 L6 L7 A1 L12 L14 | L1 A0 L6 L8 A1 L14
sketch "Niceusbopeninig2" plane through (0, 43, 0) normal (0, 1, 0) x (-1, 0, 0)
  line L0 (-71.0462, 0) -> (78.8538, 0)
  line L1 (-71.0462, 10.5) -> (-71.0462, 0)
  line L2 (78.8538, 10.5) -> (-71.0462, 10.5)
  line L3 (78.8538, 0) -> (78.8538, 10.5)
  line L4 (68.0221, 12.5789) -> (68.2393, 12.4584)
  line L5 (68.2393, 12.4584) -> (68.4202, 12.3136)
  line L6 (68.0221, 9.6111) -> (67.7927, 9.5384)
  line L7 (68.7819, 11.4327) -> (68.7819, 10.7693)
  line L8 (68.4202, 12.3136) -> (68.577, 12.1207)
  line L9 (67.7927, 9.5384) -> (67.5393, 9.5145)
  line L10 (68.7579, 11.6741) -> (68.7819, 11.4327)
  line L11 (67.5393, 9.5145) -> (61.085, 9.5145)
  line L12 (59.8424, 11.4327) -> (59.8664, 11.6741)
  line L13 (60.0473, 10.0696) -> (59.9388, 10.2745)
  line L14 (59.9388, 10.2745) -> (59.8664, 10.5159)
  line L15 (60.3853, 9.7316) -> (60.2041, 9.8767)
  line L16 (60.2041, 9.8767) -> (60.0473, 10.0696)
  line L17 (59.8664, 10.5159) -> (59.8424, 10.7693)
  line L18 (59.8424, 10.7693) -> (59.8424, 11.4327)
  line L19 (59.9388, 11.9152) -> (60.0473, 12.1207)
  line L20 (60.2041, 12.3136) -> (60.3853, 12.4584)
  line L21 (67.5393, 12.6755) -> (67.7927, 12.6513)
  line L22 (61.085, 12.6755) -> (67.5393, 12.6755)
  line L23 (60.3853, 12.4584) -> (60.6025, 12.5789)
  line L24 (67.7927, 12.6513) -> (68.0221, 12.5789)
  line L25 (60.6025, 9.6111) -> (60.3853, 9.7316)
  line L26 (68.2393, 9.7316) -> (68.0221, 9.6111)
  line L27 (61.085, 9.5145) -> (60.8316, 9.5384)
  line L28 (60.6025, 12.5789) -> (60.8316, 12.6513)
  line L29 (60.0473, 12.1207) -> (60.2041, 12.3136)
  line L30 (60.8316, 9.5384) -> (60.6025, 9.6111)
  line L31 (68.6853, 10.2745) -> (68.577, 10.0696)
  line L32 (59.8664, 11.6741) -> (59.9388, 11.9152)
  line L33 (68.6853, 11.9152) -> (68.7579, 11.6741)
  line L34 (68.4202, 9.8767) -> (68.2393, 9.7316)
  line L35 (60.8316, 12.6513) -> (61.085, 12.6755)
  line L36 (68.7819, 10.7693) -> (68.7579, 10.5159)
  line L37 (68.577, 10.0696) -> (68.4202, 9.8767)
  line L38 (68.577, 12.1207) -> (68.6853, 11.9152)
  line L39 (68.7579, 10.5159) -> (68.6853, 10.2745)
extrude "Extrude7" cut sketch "Niceusbopeninig2" against normal blind 68 contours L2 L6 L9 L11 L13 L14 L15 L16 L25 L26 L27 L30 L31 L34 L37 L39
